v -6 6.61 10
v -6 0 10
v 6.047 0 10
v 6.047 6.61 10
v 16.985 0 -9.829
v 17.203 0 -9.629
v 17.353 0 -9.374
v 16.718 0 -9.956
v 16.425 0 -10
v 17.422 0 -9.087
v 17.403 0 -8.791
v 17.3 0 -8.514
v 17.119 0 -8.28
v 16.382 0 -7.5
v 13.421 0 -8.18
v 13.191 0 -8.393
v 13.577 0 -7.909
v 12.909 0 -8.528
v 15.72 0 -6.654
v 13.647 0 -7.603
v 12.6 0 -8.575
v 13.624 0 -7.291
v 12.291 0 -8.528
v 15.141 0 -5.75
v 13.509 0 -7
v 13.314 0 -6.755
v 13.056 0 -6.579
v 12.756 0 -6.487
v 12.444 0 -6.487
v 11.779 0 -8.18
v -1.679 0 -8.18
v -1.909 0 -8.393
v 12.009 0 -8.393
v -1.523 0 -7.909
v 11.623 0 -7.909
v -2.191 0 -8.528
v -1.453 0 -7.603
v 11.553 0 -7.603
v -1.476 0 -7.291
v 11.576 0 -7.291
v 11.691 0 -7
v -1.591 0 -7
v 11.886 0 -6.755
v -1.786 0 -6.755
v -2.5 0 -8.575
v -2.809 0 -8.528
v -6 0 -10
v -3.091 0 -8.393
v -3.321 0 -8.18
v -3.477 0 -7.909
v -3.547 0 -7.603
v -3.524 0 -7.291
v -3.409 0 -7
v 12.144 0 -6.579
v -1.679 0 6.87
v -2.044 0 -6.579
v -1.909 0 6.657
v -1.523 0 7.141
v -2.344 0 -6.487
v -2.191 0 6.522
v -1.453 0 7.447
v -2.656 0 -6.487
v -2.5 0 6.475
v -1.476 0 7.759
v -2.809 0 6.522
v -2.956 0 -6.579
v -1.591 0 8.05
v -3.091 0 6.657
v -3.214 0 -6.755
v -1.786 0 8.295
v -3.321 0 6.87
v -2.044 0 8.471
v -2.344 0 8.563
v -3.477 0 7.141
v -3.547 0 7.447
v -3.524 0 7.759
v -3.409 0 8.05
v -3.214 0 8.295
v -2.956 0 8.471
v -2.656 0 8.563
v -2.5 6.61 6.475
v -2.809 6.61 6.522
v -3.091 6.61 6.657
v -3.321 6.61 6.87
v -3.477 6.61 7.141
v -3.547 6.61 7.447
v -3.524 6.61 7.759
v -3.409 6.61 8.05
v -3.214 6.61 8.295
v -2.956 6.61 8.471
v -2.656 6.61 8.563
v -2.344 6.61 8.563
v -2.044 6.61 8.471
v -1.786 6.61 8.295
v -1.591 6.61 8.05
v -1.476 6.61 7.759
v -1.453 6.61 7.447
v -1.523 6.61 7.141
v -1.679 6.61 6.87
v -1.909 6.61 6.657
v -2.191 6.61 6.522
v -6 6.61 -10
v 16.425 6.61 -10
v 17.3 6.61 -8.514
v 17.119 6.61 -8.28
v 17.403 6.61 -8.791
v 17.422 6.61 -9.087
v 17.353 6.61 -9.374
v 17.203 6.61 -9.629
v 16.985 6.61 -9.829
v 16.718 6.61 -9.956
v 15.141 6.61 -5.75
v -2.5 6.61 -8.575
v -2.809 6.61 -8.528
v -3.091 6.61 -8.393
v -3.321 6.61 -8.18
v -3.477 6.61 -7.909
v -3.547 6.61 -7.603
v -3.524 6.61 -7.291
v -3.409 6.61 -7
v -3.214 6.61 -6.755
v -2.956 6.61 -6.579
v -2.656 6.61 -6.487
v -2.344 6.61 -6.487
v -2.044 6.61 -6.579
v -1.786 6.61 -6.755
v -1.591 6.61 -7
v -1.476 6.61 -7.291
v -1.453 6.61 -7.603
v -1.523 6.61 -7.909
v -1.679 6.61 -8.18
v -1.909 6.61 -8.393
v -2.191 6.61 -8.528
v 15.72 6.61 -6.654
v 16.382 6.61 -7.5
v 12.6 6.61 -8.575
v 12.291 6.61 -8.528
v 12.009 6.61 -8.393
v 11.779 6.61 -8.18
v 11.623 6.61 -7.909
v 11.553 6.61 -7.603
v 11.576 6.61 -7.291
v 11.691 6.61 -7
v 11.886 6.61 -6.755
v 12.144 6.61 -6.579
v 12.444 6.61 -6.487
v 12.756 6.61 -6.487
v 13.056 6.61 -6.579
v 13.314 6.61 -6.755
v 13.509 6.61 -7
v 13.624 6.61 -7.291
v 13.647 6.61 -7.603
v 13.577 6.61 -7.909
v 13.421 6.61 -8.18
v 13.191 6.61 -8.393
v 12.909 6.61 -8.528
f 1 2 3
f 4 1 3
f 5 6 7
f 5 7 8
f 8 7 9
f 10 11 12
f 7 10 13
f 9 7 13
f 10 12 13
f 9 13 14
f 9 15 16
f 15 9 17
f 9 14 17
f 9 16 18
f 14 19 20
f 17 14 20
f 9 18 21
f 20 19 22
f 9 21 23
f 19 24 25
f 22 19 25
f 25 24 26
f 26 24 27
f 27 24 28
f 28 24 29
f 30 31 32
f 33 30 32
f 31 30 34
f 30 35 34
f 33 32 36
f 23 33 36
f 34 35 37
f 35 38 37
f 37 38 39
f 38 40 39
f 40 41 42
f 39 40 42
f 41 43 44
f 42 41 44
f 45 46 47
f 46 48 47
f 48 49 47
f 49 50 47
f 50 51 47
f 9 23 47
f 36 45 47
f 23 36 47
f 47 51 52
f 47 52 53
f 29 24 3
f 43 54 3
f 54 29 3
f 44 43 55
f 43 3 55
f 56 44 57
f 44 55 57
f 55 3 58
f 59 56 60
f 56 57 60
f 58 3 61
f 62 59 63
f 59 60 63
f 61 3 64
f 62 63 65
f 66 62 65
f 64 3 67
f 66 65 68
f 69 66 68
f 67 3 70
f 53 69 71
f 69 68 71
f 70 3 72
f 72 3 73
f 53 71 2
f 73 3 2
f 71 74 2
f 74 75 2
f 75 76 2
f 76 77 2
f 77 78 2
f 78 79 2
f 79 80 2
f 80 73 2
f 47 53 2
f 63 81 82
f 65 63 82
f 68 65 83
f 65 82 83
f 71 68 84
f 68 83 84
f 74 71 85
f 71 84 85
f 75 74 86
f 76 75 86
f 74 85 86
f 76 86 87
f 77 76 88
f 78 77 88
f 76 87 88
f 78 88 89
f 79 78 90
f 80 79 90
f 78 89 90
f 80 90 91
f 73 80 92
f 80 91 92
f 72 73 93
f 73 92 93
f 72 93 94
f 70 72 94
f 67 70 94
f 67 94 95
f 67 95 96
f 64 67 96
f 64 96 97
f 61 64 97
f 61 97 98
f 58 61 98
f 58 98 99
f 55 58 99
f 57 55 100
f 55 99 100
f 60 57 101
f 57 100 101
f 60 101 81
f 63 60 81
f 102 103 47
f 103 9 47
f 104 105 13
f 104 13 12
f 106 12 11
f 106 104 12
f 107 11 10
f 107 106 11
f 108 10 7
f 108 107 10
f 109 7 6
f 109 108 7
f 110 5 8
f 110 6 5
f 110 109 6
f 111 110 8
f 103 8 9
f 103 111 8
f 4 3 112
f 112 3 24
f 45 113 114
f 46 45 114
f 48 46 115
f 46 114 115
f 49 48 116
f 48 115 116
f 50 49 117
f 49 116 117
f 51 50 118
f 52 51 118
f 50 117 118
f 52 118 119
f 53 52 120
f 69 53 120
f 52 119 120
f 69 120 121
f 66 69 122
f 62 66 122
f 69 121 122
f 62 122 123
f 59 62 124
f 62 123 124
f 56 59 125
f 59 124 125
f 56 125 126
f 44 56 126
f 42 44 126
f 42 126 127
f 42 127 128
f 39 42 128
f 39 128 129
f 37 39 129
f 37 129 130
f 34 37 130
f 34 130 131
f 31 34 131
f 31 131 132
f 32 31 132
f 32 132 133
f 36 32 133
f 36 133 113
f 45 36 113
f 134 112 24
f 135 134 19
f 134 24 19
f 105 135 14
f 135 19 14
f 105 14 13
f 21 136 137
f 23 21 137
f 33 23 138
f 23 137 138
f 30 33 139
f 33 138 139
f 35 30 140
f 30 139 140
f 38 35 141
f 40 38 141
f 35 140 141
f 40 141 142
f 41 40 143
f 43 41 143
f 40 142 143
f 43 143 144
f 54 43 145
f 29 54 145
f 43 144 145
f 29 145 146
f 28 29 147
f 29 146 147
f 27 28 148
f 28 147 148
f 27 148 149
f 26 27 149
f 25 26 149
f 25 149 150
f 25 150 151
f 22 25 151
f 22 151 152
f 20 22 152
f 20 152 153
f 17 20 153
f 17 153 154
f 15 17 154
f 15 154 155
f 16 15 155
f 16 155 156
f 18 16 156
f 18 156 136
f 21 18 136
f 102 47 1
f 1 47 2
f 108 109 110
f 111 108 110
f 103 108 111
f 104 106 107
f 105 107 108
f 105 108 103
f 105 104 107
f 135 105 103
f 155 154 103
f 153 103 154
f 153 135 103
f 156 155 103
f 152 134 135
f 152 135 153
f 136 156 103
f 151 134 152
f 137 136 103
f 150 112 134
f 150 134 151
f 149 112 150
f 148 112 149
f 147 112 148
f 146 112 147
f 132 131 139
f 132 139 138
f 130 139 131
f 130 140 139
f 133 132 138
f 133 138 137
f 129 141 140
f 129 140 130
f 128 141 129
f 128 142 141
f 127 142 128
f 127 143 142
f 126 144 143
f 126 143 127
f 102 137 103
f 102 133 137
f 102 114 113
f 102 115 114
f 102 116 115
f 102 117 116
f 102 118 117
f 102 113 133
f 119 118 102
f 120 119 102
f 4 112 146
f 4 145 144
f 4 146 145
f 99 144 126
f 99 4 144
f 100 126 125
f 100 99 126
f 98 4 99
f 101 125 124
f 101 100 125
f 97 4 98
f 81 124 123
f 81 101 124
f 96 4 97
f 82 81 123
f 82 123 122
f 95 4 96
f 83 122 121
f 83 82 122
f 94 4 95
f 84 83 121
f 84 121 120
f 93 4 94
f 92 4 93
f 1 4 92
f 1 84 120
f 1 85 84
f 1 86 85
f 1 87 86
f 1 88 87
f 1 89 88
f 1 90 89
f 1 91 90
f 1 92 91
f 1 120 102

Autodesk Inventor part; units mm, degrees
ref_plane "YZ Plane" through (0, 0, 0) normal (1, 0, 0) x (0, 1, 0)
ref_plane "XZ Plane" through (0, 0, 0) normal (0, 1, 0) x (-1, 0, 0)
ref_plane "XY Plane" through (0, 0, 0) normal (0, 0, 1) x (1, 0, 0)
sketch "Sketch1" plane through (0, 0, 0) normal (0, 1, 0) x (-1, 0, 0)
  line L0 (4, 10) -> (-19.4211, 10)
  line L1 (-19.4211, -10) -> (4, -10)
  line L2 (4, -10) -> (4, 10)
  arc A0 (-19.4211, -10) -> (-19.4211, 10) centre (-25.1, 0) ccw
  line L3 (4, -10) -> (6, -10)
  line L4 (6, -10) -> (6, 10)
  line L5 (6, 10) -> (4, 10)
  line L6 (4, 10) -> (4, -10)
  point P0 (0, 0)
  dimension "d0" = 20
  dimension "d2" = 4
  dimension "d3" = 10
  dimension "d6" = 10
  dimension "d7" = 23
  dimension "d8" = 29.1
  dimension "d11" = 23.4211
  dimension "d12" = 20
  dimension "d13" = 2
extrude "Extrusion1" add sketch "Sketch1" along normal blind 6.61
fillet "Fillet1" radius 1 2 edges at (19.4211, 3.305, -10) (19.4211, 3.305, 10)
sketch "Sketch3" plane through (0, 0, 0) normal (0, -1, 0) x (1, 0, 0)
  circle A0 centre (-2.5, -7.525) radius 1.05
  circle A1 centre (12.6, -7.525) radius 1.05
  circle A2 centre (12.6, 7.525) radius 1.05
  circle A3 centre (-2.5, 7.525) radius 1.05
  point P0 (0, 0)
hole "Hole2" at (-2.5, 0, -7.525) at (-2.5, 0, 7.525) at (12.6, 0, 7.525) at (12.6, 0, -7.525) direction (0, 1, 0) diameter 2.1 end through all
sketch "Sketch4" plane through (0, 0, 0) normal (0, -1, 0) x (1, 0, 0)
  line L0 (1.4953, 17.8846) -> (19.0725, -12.5601)
  arc A0 (17.1193, 8.28) -> (17.1193, -8.28) centre (25.1, 0) ccw projected
  arc A1 (17.1193, 8.28) -> (16.4253, 10) centre (16.4253, 9) ccw projected
  line L1 (-6, 10) -> (16.4253, 10) projected
  point P0 (0, 0)
  point P1 (6.0474, 10)
  point P2 (15.1407, -5.75)
  dimension "d29" = 60
extrude "Extrusion2" cut sketch "Sketch4" against normal up to next
properties part number "3D_printed_part"
